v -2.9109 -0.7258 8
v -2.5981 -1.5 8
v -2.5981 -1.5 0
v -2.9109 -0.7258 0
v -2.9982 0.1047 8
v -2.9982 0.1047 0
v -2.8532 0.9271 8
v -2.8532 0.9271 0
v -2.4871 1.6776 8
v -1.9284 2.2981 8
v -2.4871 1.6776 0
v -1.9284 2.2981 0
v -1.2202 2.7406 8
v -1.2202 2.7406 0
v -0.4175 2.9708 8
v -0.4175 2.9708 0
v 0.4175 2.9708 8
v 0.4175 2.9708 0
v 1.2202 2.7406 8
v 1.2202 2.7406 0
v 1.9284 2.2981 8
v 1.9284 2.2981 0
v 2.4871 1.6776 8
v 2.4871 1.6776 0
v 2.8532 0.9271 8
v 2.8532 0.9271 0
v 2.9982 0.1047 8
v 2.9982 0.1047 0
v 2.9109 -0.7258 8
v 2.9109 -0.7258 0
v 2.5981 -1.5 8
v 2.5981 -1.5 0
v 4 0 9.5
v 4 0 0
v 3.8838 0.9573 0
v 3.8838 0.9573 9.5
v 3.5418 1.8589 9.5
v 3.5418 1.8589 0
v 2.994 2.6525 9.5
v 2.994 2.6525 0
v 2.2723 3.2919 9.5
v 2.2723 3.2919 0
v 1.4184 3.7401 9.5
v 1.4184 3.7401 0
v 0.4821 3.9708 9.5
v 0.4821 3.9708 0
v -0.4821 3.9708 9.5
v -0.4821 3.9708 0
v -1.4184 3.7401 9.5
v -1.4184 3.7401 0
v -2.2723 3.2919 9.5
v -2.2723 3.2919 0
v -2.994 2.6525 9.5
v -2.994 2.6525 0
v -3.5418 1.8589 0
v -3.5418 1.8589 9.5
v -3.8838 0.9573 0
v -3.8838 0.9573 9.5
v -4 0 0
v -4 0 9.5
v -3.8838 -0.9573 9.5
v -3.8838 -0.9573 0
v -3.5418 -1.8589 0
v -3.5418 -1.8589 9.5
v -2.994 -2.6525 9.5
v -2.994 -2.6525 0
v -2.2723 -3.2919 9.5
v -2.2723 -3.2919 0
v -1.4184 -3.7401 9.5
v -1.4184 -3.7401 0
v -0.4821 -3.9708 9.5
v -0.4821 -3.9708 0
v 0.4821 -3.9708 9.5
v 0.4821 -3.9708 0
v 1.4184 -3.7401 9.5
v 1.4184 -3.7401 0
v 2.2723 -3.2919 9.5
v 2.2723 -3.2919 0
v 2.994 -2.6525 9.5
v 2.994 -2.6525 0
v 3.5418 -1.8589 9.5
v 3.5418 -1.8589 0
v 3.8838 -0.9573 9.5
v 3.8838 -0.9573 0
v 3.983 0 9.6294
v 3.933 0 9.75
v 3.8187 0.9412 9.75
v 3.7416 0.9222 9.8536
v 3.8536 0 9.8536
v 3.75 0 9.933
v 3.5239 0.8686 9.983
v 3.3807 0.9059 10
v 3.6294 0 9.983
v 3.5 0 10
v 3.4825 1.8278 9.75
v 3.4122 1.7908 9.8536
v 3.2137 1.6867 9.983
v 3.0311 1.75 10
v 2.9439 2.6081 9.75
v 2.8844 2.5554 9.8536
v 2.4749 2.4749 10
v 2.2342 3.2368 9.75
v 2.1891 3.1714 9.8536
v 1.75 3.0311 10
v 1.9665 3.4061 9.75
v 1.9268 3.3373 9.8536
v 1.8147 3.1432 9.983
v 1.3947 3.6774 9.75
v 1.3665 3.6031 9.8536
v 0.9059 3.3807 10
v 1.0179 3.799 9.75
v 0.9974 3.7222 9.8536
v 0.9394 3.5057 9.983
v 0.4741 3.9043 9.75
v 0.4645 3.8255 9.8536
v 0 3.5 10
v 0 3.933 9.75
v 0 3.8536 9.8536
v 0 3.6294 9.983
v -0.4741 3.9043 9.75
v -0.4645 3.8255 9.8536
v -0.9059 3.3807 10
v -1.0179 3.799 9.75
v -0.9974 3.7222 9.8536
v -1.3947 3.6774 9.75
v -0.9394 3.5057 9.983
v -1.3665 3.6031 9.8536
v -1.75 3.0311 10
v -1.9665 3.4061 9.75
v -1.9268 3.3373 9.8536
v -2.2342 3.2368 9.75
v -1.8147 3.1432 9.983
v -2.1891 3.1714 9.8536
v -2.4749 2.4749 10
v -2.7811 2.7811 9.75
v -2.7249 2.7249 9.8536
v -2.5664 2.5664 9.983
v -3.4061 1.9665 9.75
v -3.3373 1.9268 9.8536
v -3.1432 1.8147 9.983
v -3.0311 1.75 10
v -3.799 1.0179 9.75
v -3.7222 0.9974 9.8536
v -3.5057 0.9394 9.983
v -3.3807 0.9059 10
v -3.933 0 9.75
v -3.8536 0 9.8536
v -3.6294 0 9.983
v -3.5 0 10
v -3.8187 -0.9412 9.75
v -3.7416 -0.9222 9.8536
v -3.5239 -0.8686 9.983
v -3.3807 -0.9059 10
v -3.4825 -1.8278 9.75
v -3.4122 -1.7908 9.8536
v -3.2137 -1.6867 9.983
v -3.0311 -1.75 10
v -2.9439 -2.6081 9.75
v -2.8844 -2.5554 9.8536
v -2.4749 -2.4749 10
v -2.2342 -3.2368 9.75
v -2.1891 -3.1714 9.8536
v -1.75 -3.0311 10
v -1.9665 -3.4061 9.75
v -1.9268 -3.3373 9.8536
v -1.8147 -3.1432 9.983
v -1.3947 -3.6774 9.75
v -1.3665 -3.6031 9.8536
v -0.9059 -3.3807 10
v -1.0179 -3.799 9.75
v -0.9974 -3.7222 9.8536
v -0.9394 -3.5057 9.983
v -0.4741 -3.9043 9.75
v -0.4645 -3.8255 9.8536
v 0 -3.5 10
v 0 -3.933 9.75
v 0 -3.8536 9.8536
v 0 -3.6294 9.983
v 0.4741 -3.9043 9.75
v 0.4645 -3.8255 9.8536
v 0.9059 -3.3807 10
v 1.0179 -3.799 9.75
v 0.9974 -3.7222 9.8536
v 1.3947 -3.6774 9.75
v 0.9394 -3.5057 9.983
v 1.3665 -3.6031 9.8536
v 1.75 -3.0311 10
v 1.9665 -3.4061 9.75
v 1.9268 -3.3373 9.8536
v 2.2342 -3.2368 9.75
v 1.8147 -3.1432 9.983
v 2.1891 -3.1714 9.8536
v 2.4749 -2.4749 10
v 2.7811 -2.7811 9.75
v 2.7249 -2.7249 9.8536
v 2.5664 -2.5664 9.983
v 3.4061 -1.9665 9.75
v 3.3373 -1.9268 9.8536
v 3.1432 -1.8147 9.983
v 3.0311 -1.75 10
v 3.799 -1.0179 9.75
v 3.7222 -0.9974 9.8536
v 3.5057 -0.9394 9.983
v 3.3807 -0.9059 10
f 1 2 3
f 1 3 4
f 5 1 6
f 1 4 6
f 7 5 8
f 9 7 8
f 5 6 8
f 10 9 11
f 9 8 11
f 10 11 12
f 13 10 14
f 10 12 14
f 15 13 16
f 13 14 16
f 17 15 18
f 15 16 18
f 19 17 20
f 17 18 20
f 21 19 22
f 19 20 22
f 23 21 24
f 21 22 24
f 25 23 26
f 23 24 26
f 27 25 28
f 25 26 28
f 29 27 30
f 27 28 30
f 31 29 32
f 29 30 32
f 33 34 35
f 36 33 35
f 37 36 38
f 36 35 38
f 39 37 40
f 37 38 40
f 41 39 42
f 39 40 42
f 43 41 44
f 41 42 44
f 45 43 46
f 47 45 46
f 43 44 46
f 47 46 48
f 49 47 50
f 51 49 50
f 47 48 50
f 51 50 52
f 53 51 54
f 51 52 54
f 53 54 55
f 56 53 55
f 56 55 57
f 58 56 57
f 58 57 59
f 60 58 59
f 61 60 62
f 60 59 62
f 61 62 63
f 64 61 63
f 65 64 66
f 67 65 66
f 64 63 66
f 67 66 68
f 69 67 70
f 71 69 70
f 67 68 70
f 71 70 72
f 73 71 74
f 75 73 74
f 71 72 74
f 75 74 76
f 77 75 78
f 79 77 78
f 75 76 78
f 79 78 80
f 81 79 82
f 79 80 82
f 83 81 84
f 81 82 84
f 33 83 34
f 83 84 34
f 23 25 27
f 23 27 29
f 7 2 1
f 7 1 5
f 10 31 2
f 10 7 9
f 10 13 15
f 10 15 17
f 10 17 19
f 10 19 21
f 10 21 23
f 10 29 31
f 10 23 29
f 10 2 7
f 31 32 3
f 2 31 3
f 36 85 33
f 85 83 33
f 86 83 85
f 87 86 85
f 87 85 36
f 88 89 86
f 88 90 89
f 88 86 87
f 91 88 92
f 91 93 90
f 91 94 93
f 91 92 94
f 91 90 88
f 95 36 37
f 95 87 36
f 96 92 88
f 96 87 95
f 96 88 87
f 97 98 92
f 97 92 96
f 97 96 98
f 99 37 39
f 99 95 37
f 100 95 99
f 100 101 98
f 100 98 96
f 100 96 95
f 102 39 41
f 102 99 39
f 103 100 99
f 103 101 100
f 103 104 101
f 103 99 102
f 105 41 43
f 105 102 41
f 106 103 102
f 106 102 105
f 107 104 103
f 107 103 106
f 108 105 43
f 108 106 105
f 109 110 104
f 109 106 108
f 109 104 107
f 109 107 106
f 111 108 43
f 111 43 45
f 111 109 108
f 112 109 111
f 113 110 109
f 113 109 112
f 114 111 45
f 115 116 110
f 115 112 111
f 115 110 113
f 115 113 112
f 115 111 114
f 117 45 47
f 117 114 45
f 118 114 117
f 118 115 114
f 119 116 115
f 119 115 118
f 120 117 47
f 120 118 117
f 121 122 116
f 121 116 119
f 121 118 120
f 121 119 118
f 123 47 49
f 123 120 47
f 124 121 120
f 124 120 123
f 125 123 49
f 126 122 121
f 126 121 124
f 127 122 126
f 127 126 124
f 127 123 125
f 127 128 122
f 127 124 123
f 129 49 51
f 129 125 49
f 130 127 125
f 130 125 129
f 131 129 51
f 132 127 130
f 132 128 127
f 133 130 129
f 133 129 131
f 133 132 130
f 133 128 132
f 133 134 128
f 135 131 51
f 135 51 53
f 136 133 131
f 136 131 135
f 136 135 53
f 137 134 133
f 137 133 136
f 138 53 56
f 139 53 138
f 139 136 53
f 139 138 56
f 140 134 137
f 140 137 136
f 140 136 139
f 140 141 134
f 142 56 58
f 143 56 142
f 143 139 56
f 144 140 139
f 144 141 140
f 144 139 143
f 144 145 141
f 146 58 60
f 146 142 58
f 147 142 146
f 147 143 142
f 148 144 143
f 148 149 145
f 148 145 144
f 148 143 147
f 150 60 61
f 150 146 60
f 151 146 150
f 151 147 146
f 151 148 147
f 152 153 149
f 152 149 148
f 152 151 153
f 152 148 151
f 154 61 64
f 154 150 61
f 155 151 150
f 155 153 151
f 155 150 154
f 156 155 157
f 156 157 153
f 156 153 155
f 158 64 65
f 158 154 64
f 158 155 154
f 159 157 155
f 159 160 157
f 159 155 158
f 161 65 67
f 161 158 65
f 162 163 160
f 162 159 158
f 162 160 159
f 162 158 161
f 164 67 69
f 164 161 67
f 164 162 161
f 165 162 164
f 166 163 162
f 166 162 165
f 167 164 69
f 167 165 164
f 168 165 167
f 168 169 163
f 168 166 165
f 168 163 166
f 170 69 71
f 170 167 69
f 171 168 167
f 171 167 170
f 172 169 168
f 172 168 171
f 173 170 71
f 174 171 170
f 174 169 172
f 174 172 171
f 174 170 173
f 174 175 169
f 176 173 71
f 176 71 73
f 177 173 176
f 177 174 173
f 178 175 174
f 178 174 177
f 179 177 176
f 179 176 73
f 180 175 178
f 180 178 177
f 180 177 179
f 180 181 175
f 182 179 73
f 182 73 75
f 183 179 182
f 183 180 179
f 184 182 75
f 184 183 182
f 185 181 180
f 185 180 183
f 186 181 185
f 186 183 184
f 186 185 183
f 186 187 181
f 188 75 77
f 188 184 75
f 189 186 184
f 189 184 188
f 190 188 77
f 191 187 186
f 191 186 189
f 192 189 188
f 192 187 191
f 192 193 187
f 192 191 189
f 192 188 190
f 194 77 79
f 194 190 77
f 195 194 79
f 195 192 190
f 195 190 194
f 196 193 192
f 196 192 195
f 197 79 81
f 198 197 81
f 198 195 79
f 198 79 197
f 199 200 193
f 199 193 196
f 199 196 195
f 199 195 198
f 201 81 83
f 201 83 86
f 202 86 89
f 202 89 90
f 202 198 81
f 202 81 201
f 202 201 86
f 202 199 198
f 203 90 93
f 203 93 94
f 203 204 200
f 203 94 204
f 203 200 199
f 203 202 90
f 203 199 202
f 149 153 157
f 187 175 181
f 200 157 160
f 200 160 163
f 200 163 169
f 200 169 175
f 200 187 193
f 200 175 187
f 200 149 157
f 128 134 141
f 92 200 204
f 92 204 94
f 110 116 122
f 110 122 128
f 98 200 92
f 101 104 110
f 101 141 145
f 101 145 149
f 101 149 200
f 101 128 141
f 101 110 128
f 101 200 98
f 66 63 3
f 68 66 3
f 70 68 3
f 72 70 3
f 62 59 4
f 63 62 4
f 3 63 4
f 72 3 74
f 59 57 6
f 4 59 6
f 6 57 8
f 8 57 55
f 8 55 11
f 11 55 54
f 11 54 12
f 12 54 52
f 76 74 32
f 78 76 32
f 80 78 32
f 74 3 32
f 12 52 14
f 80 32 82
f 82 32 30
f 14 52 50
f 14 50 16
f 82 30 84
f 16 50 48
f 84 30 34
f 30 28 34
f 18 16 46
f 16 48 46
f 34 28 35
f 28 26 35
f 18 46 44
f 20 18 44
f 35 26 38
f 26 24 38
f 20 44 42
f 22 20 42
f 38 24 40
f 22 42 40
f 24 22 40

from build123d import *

# Parameters (mm, degrees)
SKETCH1_R      = 4
BASE_DEPTH     = 10
POT_HOLE_DEPTH = 8
FILLET1_R      = 0.5


with BuildPart() as part:
    # Sketch1 → Base (new body)
    with BuildSketch(Plane.XY):
        Circle(SKETCH1_R)
    extrude(amount=BASE_DEPTH)

    # Sketch2 → Pot Hole (cut)
    with BuildSketch(Plane(origin=(0, 0, 0), x_dir=(-1, 0, 0), z_dir=(0, 0, -1))):
        with BuildLine():
            Line((-2.598076211, -1.5), (2.598076211, -1.5))
            ThreePointArc((2.598076211, -1.5), (0, 3), (-2.598076211, -1.5))
        make_face()
    extrude(amount=-POT_HOLE_DEPTH, mode=Mode.SUBTRACT)

    # Fillet1
    fillet1_edges = [part.edges().sort_by_distance(p)[0] for p in [
        (-4, 0, 10),
    ]]
    fillet(fillet1_edges, radius=FILLET1_R)


solid = part.part
